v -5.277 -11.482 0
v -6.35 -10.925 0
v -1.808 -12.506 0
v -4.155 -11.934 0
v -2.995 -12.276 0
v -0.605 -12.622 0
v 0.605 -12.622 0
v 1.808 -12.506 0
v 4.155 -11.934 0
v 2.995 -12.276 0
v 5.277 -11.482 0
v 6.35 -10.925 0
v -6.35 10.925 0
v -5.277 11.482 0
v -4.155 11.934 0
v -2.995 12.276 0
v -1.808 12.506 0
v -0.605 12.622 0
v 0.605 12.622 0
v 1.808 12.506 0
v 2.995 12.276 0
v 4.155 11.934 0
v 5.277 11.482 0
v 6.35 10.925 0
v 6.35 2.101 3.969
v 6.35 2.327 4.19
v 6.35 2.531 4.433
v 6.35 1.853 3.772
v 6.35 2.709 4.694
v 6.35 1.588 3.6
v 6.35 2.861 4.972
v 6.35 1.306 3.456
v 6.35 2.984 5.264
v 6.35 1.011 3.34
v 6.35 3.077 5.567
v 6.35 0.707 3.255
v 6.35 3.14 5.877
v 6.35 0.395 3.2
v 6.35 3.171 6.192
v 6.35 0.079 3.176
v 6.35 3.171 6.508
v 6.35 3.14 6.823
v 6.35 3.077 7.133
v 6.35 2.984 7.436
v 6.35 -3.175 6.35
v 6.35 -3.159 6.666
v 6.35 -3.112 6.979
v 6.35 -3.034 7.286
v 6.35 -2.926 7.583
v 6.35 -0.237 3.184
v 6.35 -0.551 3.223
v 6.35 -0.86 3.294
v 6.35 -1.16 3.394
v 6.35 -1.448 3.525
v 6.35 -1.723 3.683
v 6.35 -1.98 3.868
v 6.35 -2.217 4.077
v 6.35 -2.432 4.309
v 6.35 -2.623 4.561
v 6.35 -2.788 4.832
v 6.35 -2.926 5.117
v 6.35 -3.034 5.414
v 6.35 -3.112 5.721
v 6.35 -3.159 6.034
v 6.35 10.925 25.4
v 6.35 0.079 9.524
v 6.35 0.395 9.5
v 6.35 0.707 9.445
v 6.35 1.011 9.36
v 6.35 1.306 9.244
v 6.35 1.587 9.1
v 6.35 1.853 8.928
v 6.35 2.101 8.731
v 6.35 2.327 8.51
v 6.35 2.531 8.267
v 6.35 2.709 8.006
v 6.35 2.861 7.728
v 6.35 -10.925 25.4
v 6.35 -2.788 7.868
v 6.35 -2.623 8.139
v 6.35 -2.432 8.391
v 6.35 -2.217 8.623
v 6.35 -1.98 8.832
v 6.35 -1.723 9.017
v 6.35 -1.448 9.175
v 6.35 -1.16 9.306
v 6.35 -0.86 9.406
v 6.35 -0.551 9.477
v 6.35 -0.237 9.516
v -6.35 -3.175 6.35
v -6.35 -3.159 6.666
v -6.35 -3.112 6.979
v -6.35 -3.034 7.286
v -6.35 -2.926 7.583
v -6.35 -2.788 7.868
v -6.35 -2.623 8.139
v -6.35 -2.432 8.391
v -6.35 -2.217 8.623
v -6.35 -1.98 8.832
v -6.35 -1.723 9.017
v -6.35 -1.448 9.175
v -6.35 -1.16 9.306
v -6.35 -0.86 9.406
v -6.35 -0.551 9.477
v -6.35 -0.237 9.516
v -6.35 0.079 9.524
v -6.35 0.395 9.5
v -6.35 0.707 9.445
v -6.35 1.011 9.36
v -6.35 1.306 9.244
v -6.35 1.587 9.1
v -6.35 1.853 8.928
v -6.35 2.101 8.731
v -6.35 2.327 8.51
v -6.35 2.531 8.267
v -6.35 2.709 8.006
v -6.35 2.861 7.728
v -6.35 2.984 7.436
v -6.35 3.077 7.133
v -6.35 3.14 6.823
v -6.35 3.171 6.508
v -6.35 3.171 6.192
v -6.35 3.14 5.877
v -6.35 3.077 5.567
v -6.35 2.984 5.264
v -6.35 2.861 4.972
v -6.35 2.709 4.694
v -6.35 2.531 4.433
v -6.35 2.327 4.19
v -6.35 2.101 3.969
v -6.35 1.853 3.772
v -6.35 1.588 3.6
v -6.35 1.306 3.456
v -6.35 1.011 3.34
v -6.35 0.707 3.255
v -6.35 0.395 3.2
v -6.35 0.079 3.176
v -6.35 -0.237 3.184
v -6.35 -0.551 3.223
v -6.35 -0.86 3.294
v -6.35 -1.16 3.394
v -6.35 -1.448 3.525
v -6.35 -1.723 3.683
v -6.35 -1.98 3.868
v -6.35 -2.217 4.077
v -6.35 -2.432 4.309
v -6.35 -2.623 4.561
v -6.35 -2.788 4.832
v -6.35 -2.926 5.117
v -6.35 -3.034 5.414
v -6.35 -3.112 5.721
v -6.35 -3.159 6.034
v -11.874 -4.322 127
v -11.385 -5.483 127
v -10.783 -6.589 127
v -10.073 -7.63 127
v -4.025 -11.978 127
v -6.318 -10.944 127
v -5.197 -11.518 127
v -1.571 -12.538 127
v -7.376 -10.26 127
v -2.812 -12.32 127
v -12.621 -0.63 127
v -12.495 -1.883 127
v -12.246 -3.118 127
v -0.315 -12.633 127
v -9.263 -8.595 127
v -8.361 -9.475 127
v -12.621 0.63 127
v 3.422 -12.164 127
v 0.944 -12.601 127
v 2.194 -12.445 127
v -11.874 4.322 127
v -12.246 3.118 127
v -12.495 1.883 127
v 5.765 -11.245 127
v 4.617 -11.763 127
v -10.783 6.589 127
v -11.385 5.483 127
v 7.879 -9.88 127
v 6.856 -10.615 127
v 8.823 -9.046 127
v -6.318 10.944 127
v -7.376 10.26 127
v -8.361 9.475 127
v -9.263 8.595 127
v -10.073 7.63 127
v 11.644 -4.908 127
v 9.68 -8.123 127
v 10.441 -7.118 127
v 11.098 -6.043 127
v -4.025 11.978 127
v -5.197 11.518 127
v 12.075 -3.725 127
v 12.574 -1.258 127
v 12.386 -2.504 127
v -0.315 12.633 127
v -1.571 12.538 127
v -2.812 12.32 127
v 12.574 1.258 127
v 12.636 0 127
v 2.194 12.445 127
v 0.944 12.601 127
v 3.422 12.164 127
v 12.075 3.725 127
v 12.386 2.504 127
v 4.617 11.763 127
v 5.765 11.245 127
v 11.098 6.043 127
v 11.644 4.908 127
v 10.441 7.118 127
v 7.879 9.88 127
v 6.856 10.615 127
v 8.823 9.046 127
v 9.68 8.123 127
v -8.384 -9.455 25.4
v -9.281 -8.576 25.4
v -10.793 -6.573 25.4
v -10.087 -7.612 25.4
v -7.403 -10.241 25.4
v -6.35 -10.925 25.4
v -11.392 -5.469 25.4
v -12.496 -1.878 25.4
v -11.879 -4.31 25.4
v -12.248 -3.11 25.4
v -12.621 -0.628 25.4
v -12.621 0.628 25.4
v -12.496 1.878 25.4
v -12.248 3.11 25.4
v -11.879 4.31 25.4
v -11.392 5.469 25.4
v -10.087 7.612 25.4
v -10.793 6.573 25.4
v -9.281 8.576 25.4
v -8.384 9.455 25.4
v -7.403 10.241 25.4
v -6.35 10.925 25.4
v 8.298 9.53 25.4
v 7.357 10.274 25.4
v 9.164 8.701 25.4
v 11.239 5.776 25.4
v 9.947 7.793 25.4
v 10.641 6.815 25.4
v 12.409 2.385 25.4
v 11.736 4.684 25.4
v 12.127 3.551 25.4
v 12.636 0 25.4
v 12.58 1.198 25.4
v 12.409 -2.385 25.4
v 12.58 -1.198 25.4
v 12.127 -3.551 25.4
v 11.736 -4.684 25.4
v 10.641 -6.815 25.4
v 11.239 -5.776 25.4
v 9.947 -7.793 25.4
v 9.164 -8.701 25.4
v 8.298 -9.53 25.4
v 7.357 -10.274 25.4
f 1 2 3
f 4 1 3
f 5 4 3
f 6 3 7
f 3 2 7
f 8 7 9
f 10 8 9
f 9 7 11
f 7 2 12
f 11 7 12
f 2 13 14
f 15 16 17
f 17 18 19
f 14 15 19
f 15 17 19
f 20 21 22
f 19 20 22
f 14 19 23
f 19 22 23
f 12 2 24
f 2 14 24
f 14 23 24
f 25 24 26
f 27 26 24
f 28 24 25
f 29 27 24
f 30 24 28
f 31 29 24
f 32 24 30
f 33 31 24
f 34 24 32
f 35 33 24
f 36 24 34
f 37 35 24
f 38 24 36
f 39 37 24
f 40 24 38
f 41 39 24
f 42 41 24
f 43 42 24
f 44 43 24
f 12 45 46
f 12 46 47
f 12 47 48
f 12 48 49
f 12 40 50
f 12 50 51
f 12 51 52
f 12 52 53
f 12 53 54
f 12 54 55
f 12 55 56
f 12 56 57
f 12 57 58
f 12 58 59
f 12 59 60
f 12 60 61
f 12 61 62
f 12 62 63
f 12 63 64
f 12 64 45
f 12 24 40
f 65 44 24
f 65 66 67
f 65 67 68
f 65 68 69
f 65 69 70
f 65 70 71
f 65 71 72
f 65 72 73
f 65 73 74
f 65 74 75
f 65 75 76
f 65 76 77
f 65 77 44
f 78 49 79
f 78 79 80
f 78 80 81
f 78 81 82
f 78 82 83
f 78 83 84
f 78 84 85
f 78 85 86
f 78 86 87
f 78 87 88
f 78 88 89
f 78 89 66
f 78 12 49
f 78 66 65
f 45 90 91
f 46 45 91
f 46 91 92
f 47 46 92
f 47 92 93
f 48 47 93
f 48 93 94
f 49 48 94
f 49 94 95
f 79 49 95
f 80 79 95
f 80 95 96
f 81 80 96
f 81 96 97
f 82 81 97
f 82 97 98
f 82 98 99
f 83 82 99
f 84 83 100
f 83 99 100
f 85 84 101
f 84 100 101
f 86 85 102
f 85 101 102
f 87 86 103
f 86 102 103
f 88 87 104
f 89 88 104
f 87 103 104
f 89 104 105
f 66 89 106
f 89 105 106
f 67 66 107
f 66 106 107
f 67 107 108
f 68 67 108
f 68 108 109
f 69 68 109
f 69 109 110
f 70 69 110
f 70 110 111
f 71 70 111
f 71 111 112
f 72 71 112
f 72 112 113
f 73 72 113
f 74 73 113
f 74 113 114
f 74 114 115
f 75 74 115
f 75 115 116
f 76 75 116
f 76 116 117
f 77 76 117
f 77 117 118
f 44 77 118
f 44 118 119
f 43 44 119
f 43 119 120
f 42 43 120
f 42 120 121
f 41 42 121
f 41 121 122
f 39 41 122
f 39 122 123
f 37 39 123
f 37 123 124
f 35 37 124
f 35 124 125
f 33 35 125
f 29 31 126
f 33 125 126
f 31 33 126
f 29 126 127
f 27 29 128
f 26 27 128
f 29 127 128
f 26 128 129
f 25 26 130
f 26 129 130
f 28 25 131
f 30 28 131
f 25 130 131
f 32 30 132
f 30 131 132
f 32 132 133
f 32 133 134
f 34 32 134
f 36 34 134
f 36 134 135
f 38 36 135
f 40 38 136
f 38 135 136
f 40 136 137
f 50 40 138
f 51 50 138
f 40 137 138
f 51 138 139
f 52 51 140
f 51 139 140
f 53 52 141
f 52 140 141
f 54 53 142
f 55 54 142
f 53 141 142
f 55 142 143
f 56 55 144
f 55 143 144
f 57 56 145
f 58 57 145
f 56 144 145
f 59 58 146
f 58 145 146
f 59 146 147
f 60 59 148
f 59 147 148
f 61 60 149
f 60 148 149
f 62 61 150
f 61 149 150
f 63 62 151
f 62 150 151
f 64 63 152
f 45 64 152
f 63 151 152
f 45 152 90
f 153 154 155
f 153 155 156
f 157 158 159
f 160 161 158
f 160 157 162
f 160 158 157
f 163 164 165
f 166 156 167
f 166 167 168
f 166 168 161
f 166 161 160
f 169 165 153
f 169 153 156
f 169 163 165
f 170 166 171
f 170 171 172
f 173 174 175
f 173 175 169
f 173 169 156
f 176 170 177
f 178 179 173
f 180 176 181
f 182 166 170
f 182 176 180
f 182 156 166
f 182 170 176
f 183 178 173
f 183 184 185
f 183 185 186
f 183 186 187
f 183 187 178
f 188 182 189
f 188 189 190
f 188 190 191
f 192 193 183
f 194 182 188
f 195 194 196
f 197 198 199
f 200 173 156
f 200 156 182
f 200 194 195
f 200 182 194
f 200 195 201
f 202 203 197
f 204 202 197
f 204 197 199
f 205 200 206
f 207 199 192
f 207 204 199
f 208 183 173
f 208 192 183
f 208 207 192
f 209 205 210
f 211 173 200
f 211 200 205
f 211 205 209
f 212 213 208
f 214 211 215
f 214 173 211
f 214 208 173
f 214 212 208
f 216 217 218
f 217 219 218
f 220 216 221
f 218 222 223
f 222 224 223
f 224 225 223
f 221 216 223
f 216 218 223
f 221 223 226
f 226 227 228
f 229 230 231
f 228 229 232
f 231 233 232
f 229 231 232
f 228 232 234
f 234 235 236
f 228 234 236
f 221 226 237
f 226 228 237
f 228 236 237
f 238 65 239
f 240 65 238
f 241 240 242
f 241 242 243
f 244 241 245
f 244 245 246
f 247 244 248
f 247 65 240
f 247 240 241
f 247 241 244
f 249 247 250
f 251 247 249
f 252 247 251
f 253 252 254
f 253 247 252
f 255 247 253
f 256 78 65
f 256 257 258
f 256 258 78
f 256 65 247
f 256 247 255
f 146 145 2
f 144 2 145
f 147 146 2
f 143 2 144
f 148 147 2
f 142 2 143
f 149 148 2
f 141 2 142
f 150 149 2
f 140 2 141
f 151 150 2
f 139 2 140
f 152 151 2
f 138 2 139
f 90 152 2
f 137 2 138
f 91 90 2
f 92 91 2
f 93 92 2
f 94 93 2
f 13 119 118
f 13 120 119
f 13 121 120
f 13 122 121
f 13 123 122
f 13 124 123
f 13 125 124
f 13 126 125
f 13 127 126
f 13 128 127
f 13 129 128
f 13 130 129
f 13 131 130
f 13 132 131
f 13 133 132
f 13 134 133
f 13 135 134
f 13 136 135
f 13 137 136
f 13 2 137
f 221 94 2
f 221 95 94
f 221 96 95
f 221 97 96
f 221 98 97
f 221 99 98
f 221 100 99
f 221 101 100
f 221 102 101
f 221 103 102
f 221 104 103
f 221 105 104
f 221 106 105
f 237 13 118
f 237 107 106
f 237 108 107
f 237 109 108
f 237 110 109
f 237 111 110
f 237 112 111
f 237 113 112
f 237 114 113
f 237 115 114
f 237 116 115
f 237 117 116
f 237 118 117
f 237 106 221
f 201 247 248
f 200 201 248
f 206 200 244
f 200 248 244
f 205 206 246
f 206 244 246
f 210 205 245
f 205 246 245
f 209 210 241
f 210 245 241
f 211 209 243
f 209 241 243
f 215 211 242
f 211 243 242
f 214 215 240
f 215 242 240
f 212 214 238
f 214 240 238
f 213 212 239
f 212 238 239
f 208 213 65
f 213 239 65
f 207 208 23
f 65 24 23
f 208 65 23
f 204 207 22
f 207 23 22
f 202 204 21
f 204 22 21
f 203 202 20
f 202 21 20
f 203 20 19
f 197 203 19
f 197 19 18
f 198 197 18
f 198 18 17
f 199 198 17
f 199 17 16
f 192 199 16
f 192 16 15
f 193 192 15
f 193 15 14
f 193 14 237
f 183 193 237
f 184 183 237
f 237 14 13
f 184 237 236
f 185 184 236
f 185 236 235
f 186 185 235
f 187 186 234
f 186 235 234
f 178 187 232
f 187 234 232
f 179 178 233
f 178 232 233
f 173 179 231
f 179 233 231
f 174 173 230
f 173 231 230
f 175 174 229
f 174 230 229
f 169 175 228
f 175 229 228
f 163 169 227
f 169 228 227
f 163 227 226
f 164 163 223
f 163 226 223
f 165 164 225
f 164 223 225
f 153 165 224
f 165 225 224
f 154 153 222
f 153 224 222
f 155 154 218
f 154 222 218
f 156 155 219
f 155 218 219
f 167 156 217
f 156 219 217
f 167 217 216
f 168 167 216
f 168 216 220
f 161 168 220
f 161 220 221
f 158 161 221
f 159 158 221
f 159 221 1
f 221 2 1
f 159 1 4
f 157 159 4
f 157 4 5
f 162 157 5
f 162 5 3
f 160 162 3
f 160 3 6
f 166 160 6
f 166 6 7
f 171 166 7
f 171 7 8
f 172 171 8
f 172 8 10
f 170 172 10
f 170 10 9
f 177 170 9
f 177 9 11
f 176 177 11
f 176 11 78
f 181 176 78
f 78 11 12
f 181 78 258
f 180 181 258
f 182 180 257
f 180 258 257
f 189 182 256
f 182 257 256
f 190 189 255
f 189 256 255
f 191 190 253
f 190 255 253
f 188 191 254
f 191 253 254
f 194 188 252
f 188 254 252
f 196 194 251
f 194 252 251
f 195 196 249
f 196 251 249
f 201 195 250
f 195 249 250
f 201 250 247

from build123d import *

# Parameters (mm, degrees)
F0_R     = 12.6365
F1_DEPTH = 127
F2_W     = 13.516908
F2_H     = 36.040129
F3_DEPTH = 12.7
F4_R     = 3.175
F5_DEPTH = 25.4


with BuildPart() as f1:
    # F0 (on Top) → F1 (new body)
    with BuildSketch(Plane.XY):
        Circle(F0_R)
    extrude(amount=F1_DEPTH)

    # F2 (on Front) → F3 (cut, symmetric)
    with BuildSketch(Plane.XZ):
        with Locations((-13.108454, 7.379935)):
            Rectangle(F2_W, F2_H)
        with Locations((13.108454, 7.379935)):
            Rectangle(F2_W, F2_H)
    extrude(amount=F3_DEPTH, both=True, mode=Mode.SUBTRACT)

    # F4 (on face) → F5 (cut)
    with BuildSketch(Plane(origin=(-6.35, 0, 0), x_dir=(0, -1, 0), z_dir=(-1, 0, 0))):
        with Locations((0, 6.35)):
            Circle(F4_R)
    extrude(amount=-F5_DEPTH, mode=Mode.SUBTRACT)


solid = f1.part
